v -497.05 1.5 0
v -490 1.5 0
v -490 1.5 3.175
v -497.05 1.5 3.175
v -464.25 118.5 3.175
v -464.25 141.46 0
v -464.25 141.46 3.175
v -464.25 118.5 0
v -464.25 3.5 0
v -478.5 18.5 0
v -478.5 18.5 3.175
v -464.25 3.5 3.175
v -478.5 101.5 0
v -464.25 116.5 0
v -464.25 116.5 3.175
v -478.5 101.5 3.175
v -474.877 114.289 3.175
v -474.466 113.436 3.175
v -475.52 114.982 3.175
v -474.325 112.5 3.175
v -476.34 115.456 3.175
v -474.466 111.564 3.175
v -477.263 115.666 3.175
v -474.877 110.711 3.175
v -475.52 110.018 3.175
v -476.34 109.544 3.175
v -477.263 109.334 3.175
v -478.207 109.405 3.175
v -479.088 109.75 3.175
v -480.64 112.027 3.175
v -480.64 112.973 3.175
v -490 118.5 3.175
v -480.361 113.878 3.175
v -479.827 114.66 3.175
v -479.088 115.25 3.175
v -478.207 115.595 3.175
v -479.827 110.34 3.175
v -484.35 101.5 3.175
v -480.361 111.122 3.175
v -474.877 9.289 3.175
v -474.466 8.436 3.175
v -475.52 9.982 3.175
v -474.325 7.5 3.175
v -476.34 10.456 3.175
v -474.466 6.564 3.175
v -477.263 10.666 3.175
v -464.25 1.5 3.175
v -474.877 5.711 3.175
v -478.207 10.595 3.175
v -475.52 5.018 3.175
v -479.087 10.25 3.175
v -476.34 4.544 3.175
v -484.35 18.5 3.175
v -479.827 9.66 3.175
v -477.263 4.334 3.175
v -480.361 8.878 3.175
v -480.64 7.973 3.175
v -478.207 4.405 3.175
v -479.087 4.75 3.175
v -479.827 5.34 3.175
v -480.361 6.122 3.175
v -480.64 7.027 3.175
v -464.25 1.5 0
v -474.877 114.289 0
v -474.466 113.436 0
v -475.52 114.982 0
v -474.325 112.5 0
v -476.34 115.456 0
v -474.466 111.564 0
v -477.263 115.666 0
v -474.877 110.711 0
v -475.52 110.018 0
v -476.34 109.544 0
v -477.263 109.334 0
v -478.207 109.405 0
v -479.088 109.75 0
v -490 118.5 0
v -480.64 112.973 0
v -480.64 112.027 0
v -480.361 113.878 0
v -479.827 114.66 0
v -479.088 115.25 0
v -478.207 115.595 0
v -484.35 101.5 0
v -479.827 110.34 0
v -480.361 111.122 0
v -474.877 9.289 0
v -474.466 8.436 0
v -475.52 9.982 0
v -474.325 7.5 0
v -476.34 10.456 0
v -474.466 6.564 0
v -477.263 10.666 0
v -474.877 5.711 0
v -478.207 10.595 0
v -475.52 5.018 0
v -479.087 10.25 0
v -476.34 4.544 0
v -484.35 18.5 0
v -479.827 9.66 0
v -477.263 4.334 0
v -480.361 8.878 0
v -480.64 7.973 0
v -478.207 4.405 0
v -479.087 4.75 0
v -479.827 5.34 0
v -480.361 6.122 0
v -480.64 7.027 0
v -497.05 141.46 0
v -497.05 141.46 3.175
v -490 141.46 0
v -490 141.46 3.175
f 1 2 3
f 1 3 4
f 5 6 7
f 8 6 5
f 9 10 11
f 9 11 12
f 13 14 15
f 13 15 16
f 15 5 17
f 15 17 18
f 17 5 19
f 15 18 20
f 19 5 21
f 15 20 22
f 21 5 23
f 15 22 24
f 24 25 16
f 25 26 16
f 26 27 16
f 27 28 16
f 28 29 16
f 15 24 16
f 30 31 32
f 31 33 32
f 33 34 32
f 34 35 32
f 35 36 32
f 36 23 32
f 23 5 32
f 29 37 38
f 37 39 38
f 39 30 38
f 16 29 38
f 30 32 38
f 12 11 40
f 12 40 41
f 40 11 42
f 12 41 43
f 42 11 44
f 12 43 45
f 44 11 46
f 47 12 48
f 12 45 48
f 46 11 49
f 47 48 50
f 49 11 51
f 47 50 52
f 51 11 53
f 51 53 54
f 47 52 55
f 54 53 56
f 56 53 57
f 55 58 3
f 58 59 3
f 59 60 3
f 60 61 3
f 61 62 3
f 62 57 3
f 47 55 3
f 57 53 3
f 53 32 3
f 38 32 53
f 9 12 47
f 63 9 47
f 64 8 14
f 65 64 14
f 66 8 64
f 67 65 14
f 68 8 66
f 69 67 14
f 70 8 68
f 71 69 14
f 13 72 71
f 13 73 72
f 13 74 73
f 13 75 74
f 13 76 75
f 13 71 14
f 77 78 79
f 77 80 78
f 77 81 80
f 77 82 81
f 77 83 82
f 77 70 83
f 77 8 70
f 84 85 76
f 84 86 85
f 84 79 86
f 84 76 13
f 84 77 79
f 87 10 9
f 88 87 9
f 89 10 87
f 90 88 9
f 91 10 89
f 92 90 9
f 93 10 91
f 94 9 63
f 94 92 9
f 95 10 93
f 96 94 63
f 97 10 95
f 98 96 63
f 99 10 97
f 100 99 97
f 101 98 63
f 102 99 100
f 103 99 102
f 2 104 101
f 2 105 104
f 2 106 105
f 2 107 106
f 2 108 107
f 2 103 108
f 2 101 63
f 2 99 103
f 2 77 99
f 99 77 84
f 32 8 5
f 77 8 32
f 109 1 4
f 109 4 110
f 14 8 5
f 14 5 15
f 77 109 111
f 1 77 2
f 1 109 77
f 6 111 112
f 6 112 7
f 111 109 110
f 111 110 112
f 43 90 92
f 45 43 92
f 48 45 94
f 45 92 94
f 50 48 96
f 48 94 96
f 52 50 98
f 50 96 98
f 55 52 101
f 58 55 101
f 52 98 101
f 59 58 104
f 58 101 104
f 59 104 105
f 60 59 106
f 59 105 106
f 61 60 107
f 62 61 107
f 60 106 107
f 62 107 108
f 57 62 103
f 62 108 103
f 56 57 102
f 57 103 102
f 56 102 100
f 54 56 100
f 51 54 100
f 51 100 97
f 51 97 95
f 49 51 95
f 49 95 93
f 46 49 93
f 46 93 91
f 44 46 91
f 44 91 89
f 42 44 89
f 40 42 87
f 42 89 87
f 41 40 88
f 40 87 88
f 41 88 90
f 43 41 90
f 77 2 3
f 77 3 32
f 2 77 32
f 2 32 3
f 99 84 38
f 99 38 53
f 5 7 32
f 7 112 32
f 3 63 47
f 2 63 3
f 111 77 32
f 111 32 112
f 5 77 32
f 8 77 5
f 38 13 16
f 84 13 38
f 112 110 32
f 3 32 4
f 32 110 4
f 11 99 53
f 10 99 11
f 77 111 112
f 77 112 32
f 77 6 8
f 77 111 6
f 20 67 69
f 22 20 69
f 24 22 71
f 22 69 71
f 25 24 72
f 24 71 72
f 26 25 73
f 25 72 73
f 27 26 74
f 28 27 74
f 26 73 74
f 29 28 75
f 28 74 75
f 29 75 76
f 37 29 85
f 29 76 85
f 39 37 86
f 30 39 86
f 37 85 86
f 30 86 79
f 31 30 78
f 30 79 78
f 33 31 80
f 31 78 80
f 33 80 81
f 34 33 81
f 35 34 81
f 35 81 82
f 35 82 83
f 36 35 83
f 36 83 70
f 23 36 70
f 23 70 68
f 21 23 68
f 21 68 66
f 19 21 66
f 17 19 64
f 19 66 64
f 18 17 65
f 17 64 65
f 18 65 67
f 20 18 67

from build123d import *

# Parameters (mm, degrees)
F_3DSKETCH1_R         = 3.175
BOSS_EXTRUDE1_DEPTH   = 3.175
BOSS_EXTRUDE1_2_DEPTH = 3.175
BOSS_EXTRUDE1_3_DEPTH = 3.175


with BuildPart() as part:
    # 3DSketch1 → Boss-Extrude1 (new body)
    with BuildSketch(Plane(origin=(-464.25, 116.5, 0), x_dir=(-0.2742793236442644, -0.961650067655197, 0), z_dir=(0, 0, -1))):
        Polygon((-1.923300135, 0.548558647), (0, 0), (18.333231377, 9.589323609), (19.93776542, 15.214976505), (99.754721035, -7.550207357), (98.150186992, -13.175860253), (108.666457645, -30.993563572), (110.58975778, -31.542122219), (117.652450364, -6.779632977), (5.139392449, 25.311047889), align=None)
        with Locations(Location((108.454058413, -17.154582881, 0), (0, 0, 254.080928829))):
            Circle(F_3DSKETCH1_R, mode=Mode.SUBTRACT)
        with Locations(Location((7.480801309, 11.644746102, 0), (0, 0, 254.080928829))):
            Circle(F_3DSKETCH1_R, mode=Mode.SUBTRACT)
    extrude(amount=-BOSS_EXTRUDE1_DEPTH)


with BuildPart() as body_2:
    # 3DSketch1 → Boss-Extrude1 2 (new body)
    with BuildSketch(Plane(origin=(-464.25, 116.5, 0), x_dir=(-0.2742793236442644, -0.961650067655197, 0), z_dir=(0, 0, -1))):
        Polygon((-24.002556771, 6.845946627), (-1.923300135, 0.548558647), (5.139392449, 25.311047889), (-16.939864187, 31.608435869), align=None)
    extrude(amount=-BOSS_EXTRUDE1_2_DEPTH)


with BuildPart() as body_3:
    # 3DSketch1 → Boss-Extrude1 3 (new body)
    with BuildSketch(Plane(origin=(-464.25, 116.5, 0), x_dir=(-0.2742793236442644, -0.961650067655197, 0), z_dir=(0, 0, -1))):
        Polygon((-16.939864187, 31.608435869), (5.139392449, 25.311047889), (117.652450364, -6.779632977), (119.586119596, 0), (-15.006194955, 38.388068846), align=None)
    extrude(amount=-BOSS_EXTRUDE1_3_DEPTH)


solid = Compound([part.part, body_2.part, body_3.part])
